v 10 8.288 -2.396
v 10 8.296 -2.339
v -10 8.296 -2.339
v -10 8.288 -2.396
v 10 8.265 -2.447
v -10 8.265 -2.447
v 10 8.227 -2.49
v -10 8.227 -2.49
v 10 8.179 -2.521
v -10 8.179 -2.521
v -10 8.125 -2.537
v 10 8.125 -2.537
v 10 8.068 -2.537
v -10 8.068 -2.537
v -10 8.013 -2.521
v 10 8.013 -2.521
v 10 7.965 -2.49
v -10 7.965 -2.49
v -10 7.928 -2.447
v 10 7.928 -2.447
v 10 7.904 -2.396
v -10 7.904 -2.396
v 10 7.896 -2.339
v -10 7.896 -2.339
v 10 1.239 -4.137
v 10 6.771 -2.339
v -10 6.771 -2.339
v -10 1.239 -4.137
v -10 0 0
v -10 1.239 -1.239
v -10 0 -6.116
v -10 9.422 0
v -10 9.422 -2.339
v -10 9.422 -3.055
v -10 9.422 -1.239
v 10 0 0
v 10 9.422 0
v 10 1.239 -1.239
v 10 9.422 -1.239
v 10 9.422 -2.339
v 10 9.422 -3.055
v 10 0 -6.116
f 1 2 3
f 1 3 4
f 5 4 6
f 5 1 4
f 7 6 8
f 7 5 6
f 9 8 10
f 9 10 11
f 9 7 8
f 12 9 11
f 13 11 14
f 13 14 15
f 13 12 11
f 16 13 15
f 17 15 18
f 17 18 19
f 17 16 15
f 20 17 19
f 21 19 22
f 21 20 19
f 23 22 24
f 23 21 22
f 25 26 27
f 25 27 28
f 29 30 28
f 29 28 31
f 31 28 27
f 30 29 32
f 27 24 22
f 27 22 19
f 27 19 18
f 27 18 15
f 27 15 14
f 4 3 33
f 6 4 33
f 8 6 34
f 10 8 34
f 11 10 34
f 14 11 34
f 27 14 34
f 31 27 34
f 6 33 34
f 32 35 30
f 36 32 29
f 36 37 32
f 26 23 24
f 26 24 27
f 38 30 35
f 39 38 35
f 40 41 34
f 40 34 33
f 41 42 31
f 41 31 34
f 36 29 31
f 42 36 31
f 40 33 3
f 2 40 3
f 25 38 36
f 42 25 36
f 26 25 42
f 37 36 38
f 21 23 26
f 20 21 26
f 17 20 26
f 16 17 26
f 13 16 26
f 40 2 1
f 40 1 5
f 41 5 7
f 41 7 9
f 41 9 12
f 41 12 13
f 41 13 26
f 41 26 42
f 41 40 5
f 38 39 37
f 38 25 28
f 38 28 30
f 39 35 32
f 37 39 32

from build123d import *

# Parameters (mm, degrees)
BOSS_EXTRUDE1_DEPTH = 10


with BuildPart() as part:
    # Sketch1 → Boss-Extrude1 (new, symmetric)
    with BuildSketch(Plane(origin=(0, 0, 0), x_dir=(0, 0, -1), z_dir=(1, 0, 0))):
        with BuildLine():
            Line((0, 0), (6.116419195, 0))
            Line((6.116419195, 0), (3.055144814, 9.421633765))
            Line((3.055144814, 9.421633765), (2.339181313, 9.421633765))
            Line((2.339181313, 9.421633765), (2.339181313, 8.296337322))
            ThreePointArc((2.339181313, 8.296337322), (2.539181313, 8.096337322), (2.339181313, 7.896337322))
            Line((2.339181313, 7.896337322), (2.339181313, 6.771040879))
            Line((2.339181313, 6.771040879), (4.136591443, 1.239181313))
            Line((4.136591443, 1.239181313), (1.239181313, 1.239181313))
            Line((1.239181313, 1.239181313), (1.239181313, 9.421633765))
            Line((1.239181313, 9.421633765), (0, 9.421633765))
            Line((0, 9.421633765), (0, 0))
        make_face()
    extrude(amount=BOSS_EXTRUDE1_DEPTH, both=True)


solid = part.part
